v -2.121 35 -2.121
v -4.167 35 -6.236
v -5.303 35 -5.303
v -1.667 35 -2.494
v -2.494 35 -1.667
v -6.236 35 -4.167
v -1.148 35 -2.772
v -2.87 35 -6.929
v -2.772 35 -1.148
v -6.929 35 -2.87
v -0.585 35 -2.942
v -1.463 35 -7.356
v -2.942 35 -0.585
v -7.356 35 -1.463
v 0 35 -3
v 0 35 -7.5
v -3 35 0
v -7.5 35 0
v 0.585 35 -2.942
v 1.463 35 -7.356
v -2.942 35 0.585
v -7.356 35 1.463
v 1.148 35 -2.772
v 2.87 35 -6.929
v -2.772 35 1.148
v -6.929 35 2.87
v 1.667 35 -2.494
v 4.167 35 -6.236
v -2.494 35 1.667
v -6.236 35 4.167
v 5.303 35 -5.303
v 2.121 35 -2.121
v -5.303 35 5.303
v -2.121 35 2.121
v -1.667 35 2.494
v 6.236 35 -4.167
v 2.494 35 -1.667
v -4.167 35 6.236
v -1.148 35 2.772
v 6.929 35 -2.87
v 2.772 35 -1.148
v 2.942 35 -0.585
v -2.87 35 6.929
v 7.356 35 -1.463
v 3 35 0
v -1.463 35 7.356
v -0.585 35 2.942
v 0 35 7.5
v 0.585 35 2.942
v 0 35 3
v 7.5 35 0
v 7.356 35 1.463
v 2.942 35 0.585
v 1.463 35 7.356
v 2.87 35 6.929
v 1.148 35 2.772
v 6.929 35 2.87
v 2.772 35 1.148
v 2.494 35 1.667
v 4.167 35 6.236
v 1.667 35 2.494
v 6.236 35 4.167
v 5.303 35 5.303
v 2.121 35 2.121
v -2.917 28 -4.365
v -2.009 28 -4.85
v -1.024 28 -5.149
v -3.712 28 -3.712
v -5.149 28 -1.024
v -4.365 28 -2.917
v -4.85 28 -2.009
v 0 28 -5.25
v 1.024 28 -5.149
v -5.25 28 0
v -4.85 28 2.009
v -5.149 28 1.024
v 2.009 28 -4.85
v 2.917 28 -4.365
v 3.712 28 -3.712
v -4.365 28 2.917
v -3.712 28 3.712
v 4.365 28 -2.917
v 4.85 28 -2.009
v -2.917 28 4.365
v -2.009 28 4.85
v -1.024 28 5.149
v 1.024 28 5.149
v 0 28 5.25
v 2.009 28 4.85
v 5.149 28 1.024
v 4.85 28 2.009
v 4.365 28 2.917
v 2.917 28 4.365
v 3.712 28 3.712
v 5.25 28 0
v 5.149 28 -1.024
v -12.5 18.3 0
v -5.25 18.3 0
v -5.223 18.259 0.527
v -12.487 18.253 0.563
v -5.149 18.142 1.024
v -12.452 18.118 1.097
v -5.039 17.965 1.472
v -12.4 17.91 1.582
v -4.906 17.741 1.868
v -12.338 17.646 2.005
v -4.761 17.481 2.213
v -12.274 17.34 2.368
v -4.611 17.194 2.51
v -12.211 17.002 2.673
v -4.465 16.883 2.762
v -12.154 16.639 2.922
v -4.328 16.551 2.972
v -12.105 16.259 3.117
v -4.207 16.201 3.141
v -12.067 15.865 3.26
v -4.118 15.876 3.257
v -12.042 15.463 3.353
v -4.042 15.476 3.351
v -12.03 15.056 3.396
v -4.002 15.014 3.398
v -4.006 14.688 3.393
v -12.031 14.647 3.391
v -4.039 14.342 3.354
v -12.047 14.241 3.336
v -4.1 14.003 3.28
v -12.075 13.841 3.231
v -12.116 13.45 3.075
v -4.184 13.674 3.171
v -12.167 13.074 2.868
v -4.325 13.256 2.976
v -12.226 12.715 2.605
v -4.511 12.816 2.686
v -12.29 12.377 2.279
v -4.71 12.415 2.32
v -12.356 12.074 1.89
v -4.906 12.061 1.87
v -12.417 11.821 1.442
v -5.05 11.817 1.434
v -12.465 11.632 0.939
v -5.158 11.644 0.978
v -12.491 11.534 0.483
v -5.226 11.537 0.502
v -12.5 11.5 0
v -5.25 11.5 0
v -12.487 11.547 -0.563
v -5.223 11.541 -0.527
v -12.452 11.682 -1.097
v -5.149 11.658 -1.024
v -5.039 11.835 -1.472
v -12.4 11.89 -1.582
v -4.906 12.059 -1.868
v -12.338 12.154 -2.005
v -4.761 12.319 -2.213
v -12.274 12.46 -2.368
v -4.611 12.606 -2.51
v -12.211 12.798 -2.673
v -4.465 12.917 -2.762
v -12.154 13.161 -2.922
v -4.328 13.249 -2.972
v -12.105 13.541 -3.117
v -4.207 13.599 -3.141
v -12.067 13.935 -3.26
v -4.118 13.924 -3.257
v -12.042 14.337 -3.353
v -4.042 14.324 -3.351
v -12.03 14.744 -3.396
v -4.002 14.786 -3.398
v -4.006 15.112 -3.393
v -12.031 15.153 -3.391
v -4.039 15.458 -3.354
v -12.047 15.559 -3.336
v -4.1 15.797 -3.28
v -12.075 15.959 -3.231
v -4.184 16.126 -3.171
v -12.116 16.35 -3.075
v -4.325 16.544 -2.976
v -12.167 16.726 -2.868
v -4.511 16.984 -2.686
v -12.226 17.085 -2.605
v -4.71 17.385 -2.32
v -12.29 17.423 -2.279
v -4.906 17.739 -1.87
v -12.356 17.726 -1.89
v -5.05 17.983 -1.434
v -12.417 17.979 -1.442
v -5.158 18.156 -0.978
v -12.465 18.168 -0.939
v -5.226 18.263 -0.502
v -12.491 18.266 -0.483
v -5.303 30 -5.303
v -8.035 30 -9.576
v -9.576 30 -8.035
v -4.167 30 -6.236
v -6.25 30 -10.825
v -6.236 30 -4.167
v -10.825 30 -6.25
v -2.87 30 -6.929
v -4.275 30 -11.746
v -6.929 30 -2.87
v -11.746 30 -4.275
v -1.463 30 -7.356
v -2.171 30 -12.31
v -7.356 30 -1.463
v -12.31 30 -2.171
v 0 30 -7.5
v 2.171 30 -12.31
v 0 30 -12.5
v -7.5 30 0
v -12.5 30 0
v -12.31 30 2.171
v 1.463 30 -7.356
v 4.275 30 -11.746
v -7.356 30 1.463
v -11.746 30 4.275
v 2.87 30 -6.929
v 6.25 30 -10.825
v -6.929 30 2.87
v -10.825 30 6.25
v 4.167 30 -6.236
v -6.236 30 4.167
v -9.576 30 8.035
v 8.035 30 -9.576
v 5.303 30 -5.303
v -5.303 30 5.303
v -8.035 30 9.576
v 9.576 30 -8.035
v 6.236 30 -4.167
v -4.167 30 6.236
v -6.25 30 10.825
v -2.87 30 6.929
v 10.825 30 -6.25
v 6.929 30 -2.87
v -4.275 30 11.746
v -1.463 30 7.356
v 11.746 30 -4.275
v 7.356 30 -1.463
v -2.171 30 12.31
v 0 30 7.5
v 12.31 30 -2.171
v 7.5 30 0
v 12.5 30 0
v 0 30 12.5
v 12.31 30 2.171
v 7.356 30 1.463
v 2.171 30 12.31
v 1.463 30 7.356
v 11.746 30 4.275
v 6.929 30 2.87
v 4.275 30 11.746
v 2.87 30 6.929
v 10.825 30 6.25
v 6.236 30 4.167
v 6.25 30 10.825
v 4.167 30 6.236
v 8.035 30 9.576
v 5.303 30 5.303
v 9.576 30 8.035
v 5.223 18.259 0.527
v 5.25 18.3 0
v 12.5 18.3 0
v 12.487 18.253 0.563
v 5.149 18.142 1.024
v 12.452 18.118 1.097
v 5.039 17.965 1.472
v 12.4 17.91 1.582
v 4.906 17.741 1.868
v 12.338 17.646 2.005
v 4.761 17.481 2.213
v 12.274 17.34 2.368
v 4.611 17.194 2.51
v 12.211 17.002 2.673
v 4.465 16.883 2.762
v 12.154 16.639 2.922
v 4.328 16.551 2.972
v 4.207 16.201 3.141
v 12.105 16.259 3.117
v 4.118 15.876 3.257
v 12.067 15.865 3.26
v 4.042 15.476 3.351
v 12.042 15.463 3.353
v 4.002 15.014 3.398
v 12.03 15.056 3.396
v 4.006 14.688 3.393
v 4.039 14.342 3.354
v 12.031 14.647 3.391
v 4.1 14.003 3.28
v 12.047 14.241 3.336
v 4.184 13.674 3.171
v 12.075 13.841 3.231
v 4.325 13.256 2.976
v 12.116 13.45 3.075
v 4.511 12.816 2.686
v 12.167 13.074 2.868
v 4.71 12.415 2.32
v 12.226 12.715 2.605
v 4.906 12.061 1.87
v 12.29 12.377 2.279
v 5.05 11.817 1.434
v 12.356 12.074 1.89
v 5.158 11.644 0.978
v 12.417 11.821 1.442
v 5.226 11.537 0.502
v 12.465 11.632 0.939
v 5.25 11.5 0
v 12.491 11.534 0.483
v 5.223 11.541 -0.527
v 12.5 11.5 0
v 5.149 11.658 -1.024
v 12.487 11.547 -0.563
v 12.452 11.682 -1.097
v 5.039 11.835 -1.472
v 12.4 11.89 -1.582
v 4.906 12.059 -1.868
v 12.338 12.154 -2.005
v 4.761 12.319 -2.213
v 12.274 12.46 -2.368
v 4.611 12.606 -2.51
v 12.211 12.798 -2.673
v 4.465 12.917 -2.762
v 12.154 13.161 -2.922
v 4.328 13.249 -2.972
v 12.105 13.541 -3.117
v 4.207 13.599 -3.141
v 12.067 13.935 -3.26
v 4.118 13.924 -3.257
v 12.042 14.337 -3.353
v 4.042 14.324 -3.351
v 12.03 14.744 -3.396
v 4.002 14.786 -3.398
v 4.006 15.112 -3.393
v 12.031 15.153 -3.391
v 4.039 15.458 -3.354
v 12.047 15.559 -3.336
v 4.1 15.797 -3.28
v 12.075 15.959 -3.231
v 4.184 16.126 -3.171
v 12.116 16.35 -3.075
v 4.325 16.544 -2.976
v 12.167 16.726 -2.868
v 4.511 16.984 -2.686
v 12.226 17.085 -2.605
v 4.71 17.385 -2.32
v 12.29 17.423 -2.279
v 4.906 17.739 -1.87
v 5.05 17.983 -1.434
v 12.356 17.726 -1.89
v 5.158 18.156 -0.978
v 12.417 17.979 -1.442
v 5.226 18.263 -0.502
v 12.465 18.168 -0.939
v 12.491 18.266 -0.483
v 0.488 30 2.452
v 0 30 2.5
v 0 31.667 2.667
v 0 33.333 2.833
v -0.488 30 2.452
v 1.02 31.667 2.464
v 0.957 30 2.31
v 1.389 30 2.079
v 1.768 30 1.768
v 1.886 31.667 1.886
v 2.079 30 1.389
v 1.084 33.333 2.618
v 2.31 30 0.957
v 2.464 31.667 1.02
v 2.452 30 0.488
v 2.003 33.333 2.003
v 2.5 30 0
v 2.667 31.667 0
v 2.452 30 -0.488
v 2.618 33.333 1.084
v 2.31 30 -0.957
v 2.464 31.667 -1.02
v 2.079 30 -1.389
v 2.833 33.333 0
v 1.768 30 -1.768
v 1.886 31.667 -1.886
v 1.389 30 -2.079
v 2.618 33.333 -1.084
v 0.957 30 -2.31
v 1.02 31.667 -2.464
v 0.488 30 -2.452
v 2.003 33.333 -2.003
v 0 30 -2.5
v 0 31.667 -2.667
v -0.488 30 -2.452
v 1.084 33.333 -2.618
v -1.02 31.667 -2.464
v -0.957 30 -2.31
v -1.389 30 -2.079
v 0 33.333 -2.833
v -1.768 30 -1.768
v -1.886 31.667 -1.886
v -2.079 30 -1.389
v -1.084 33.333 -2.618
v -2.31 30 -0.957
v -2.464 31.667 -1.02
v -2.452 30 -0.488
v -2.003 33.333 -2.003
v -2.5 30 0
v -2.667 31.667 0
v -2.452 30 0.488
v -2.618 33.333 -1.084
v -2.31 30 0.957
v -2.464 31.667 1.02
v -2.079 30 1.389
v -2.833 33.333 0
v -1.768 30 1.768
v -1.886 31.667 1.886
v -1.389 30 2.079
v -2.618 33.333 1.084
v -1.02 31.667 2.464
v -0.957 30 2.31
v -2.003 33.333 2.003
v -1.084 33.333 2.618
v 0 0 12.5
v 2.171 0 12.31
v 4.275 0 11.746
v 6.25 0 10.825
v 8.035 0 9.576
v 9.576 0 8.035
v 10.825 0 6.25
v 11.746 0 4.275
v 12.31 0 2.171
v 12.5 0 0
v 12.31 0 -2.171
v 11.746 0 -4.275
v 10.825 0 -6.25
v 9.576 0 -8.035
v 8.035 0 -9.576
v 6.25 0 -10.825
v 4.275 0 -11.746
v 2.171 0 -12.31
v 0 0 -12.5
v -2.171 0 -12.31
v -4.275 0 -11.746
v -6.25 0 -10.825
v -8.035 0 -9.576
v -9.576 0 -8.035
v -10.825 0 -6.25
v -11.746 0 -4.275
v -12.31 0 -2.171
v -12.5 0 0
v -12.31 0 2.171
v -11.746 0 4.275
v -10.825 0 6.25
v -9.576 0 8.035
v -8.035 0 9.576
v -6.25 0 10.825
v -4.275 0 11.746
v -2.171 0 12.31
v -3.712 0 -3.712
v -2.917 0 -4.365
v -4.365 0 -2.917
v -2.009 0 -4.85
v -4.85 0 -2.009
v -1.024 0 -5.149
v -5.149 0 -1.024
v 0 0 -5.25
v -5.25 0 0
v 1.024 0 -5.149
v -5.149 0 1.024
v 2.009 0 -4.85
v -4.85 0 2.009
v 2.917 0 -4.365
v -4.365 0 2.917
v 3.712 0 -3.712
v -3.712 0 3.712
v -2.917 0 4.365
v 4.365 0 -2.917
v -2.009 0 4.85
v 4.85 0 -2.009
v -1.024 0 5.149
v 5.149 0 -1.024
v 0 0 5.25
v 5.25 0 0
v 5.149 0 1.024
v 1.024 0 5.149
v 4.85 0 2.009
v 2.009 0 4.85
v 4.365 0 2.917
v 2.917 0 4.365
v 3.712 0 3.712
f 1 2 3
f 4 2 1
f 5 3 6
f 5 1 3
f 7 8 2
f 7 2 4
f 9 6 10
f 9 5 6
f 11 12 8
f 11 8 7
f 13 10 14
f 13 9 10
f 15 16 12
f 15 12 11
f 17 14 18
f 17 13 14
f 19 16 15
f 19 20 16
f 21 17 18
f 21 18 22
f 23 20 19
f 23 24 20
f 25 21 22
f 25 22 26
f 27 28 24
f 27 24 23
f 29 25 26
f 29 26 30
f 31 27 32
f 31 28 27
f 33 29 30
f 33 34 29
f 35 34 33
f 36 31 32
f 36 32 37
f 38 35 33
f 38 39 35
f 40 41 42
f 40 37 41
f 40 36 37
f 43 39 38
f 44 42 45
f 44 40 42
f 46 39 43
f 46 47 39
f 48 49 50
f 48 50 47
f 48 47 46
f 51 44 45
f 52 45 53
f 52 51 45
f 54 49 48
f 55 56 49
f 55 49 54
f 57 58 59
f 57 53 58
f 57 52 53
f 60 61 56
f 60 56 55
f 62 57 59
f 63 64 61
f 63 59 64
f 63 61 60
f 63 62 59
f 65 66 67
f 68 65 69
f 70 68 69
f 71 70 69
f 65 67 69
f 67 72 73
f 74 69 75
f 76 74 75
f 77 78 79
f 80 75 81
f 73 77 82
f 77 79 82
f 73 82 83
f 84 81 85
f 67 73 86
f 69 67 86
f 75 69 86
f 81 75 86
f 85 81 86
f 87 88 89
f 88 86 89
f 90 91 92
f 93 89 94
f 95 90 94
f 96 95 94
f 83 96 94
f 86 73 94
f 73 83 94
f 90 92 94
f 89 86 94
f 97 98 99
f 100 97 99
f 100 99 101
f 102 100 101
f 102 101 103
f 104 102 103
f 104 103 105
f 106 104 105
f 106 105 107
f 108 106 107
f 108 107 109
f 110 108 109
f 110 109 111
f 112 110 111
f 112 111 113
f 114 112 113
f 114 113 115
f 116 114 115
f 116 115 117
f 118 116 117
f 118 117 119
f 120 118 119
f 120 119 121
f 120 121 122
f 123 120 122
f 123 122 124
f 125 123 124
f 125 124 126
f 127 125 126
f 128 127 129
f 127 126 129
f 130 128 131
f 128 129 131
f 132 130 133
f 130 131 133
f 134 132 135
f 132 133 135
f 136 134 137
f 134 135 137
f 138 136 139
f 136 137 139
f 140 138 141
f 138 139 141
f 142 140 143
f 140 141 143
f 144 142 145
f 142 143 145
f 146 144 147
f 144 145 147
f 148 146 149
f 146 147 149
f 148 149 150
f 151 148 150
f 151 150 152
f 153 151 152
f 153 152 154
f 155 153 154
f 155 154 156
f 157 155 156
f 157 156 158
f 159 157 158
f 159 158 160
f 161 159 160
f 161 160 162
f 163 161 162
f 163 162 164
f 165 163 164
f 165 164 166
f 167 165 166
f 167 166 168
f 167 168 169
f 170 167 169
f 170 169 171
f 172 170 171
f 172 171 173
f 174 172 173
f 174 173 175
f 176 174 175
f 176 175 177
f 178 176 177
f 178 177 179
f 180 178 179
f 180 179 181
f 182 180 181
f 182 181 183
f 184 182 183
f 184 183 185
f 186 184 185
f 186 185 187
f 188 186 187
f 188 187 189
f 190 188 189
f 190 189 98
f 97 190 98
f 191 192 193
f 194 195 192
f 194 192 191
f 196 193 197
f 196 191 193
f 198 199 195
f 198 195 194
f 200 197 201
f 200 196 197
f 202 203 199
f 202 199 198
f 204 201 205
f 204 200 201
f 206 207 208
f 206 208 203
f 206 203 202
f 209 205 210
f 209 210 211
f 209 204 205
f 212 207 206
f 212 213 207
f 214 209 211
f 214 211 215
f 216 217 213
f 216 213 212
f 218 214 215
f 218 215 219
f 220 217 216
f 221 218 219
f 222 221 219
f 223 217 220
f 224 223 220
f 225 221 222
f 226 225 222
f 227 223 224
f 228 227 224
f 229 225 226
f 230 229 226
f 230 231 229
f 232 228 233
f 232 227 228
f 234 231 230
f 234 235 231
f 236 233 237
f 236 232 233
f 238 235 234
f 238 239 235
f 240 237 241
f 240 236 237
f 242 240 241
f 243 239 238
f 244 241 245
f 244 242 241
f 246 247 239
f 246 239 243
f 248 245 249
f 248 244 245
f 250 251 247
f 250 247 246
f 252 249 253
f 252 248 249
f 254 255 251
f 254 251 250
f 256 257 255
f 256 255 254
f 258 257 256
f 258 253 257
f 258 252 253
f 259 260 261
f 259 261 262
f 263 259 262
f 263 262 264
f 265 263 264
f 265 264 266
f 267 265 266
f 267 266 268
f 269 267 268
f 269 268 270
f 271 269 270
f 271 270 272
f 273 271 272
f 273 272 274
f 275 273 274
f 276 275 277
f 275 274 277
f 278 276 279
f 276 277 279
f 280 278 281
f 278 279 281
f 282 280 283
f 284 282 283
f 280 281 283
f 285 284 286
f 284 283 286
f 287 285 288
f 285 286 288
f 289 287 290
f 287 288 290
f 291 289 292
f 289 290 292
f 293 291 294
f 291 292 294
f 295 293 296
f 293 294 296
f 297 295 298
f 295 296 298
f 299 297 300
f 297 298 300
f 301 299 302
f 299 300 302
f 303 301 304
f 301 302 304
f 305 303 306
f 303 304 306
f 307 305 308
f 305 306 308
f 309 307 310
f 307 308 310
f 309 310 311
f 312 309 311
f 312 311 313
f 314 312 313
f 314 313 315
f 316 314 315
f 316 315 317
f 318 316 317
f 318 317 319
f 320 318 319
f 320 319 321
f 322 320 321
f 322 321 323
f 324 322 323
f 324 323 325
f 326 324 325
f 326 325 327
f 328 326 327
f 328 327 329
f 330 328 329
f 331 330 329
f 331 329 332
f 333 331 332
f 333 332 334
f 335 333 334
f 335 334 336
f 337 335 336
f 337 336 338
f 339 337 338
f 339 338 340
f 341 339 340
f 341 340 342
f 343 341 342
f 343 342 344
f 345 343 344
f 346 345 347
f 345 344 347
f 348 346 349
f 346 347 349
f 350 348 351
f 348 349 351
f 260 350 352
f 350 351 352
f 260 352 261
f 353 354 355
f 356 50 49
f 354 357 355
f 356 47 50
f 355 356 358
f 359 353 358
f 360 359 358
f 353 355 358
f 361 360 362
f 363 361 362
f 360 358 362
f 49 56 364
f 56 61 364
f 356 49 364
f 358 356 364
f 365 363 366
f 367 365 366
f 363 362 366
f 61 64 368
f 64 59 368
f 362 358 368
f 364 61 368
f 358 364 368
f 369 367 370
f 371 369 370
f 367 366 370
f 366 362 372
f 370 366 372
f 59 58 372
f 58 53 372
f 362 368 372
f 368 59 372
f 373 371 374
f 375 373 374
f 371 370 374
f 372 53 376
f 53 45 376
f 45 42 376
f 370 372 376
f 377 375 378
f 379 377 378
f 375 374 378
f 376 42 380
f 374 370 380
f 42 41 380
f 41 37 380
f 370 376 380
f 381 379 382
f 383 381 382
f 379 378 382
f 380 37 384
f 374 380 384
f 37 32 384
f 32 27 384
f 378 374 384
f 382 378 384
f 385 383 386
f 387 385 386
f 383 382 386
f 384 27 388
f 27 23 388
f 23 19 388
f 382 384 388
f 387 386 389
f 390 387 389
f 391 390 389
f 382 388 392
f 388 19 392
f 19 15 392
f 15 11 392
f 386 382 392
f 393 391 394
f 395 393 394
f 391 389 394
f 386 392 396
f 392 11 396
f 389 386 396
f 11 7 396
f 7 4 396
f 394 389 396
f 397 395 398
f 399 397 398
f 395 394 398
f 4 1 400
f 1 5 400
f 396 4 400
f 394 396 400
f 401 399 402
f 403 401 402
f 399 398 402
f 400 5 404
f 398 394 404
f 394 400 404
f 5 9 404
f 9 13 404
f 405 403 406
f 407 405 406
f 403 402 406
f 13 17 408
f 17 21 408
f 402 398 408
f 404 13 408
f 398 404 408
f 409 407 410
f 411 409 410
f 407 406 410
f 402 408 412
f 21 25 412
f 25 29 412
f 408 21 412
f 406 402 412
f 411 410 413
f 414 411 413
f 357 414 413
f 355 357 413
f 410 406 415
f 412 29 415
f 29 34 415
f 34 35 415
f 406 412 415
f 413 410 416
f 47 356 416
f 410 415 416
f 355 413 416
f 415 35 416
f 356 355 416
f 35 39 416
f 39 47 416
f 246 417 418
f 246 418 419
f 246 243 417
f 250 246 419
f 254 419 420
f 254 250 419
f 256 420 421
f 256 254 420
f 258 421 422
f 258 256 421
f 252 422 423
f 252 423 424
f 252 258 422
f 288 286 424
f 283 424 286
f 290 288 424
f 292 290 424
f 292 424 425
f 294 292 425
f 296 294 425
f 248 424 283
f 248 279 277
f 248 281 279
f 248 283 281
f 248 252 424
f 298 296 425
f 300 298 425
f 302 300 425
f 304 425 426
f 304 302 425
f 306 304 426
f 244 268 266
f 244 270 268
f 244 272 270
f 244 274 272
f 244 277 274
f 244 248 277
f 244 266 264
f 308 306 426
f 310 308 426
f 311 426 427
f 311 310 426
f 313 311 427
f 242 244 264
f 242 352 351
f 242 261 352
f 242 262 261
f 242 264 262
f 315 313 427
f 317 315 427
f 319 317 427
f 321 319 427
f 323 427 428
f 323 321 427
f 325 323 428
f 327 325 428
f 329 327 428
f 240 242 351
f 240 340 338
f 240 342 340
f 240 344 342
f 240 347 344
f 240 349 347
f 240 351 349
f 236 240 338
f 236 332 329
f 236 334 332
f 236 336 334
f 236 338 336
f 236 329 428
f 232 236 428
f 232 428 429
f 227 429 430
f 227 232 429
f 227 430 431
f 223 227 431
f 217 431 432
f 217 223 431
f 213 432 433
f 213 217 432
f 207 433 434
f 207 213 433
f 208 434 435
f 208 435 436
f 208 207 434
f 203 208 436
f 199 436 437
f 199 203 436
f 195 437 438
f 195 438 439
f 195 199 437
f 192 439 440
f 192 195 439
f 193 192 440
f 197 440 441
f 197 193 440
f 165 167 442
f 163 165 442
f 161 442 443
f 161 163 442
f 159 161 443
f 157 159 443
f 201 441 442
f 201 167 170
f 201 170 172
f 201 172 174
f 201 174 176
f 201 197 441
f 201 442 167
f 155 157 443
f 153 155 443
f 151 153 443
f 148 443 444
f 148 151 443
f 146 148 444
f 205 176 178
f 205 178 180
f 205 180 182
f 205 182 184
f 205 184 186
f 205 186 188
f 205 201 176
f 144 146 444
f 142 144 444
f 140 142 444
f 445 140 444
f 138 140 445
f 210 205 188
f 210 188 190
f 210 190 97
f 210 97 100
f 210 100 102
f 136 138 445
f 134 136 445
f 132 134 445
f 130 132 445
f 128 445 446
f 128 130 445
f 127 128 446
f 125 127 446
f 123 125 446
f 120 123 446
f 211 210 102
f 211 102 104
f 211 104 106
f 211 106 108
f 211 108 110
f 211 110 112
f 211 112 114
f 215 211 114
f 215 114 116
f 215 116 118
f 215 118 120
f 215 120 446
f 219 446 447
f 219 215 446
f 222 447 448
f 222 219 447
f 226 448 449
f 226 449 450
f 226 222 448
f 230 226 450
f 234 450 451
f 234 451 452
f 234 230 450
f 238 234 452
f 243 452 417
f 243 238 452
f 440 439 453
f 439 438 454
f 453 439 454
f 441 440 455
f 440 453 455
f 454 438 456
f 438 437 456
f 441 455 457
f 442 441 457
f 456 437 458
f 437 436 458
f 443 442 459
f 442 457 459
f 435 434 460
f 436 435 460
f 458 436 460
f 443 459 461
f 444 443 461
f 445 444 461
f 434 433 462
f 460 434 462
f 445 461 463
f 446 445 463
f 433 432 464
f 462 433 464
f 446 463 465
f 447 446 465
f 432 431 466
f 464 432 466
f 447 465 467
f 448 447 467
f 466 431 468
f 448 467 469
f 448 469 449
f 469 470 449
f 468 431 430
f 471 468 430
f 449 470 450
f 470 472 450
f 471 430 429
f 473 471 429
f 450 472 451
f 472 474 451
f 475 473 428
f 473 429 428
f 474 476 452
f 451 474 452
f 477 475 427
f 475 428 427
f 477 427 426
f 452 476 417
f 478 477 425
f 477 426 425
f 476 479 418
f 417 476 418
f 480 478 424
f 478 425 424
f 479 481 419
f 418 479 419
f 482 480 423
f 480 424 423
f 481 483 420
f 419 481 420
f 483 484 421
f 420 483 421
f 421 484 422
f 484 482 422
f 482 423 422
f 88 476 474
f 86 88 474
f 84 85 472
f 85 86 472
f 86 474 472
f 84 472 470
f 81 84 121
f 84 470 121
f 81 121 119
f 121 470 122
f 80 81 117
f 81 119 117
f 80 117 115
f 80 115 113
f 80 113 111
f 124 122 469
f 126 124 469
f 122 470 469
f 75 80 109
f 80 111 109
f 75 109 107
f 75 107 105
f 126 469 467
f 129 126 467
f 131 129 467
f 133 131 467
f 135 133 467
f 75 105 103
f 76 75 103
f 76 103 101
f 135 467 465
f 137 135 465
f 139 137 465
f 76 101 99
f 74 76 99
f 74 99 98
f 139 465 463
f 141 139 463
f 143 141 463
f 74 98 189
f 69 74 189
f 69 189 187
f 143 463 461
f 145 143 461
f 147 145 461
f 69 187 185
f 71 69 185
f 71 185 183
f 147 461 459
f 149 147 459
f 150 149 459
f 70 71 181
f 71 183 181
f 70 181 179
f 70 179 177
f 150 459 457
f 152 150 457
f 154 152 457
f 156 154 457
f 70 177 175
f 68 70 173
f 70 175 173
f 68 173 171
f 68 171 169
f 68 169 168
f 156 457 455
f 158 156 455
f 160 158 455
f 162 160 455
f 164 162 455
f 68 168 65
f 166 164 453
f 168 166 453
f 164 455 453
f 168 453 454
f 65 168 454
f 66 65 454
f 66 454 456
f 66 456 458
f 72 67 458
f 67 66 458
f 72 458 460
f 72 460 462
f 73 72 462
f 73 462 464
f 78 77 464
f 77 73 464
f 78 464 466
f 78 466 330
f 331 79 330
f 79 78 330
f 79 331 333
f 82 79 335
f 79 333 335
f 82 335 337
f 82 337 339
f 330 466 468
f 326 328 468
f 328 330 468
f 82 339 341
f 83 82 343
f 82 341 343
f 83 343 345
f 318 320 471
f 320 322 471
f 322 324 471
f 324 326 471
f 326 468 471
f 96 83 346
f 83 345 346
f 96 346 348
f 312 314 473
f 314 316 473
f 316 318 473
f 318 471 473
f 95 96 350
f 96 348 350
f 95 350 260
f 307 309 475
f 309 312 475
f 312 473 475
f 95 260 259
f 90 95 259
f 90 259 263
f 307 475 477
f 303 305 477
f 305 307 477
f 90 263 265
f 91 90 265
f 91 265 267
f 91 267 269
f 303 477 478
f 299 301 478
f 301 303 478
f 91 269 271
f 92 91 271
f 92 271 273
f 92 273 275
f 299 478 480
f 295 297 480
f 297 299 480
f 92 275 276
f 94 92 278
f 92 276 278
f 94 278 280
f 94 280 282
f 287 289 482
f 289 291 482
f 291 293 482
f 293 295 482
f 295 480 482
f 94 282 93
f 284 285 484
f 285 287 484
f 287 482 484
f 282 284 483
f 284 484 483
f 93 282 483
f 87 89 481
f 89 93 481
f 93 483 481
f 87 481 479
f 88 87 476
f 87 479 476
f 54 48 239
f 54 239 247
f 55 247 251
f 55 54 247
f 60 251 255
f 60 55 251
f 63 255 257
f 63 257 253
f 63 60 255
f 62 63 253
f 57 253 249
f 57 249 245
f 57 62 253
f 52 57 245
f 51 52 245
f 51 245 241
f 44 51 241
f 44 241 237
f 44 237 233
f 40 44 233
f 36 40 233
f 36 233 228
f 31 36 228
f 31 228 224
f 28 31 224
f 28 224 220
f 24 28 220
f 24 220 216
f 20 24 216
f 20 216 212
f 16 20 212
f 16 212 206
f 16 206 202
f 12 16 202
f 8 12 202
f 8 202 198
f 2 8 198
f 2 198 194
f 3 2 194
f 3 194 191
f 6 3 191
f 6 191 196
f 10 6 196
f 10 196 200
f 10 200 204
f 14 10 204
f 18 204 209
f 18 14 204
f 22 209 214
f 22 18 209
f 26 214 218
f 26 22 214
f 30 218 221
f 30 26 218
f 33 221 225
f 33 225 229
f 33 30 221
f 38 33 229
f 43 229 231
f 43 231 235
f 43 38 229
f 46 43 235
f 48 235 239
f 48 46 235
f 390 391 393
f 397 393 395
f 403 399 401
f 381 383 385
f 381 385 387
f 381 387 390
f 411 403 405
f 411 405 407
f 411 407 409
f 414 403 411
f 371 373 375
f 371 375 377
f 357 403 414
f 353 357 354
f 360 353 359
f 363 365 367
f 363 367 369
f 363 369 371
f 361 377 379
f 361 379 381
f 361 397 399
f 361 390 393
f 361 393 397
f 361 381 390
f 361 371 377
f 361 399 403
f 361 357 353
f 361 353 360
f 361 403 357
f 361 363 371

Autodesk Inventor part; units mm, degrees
ref_plane "XZ Plane" through (0, 0, 0) normal (0, 1, 0) x (-1, 0, 0)
ref_plane "XY Plane" through (0, 0, 0) normal (0, 0, 1) x (1, 0, 0)
sketch "Sketch1" plane through (0, 0, 0) normal (1, 0, 0) x (0, 1, 0)
  line L0 (0, 0) -> (50, 0)
  line L1 (0, 5.25) -> (0, 12.5)
  line L2 (0, 12.5) -> (30, 12.5)
  line L3 (30, 12.5) -> (30, 7.5)
  line L4 (30, 7.5) -> (35, 7.5)
  line L5 (35, 7.5) -> (35, 3)
  line L6 (35, 3) -> (30, 2.5)
  line L7 (30, 2.5) -> (30, 0)
  line L8 (28, 0) -> (28, 5.25)
  line L9 (28, 5.25) -> (0, 5.25)
  line L10 (0, -2.5) -> (0, 15) projected
  dimension "d0" = 50
  dimension "d2" = 25
  dimension "d3" = 10.5
  dimension "d4" = 5
  dimension "d5" = 6
  dimension "d6" = 15
  dimension "d7" = 30
  dimension "d8" = 35
  dimension "d9" = 28
revolve "Revolution1" add sketch "Sketch1" angle 360 about axis through (0, 0, 0) along (0, 1, 0) contours L8 L9 L1 L2 L3 L4 L5 L6 L7 L0
ref_plane "Work Plane1" through (12.5, 15, 0) normal (1, 0, 0) x (0, 1, 0)
sketch "Sketch2" plane through (12.5, 15, 0) normal (1, 0, 0) x (0, 1, 0)
  line L0 (-15, 0) -> (-0.1, 0)
  circle A0 centre (-0.1, 0) radius 3.4
  dimension "d11" = 14.9
  dimension "d12" = 6.8
extrude "Extrusion1" cut sketch "Sketch2" against normal through all
properties part number "StuurPotentiometerConnector2.0_3DPrint"
